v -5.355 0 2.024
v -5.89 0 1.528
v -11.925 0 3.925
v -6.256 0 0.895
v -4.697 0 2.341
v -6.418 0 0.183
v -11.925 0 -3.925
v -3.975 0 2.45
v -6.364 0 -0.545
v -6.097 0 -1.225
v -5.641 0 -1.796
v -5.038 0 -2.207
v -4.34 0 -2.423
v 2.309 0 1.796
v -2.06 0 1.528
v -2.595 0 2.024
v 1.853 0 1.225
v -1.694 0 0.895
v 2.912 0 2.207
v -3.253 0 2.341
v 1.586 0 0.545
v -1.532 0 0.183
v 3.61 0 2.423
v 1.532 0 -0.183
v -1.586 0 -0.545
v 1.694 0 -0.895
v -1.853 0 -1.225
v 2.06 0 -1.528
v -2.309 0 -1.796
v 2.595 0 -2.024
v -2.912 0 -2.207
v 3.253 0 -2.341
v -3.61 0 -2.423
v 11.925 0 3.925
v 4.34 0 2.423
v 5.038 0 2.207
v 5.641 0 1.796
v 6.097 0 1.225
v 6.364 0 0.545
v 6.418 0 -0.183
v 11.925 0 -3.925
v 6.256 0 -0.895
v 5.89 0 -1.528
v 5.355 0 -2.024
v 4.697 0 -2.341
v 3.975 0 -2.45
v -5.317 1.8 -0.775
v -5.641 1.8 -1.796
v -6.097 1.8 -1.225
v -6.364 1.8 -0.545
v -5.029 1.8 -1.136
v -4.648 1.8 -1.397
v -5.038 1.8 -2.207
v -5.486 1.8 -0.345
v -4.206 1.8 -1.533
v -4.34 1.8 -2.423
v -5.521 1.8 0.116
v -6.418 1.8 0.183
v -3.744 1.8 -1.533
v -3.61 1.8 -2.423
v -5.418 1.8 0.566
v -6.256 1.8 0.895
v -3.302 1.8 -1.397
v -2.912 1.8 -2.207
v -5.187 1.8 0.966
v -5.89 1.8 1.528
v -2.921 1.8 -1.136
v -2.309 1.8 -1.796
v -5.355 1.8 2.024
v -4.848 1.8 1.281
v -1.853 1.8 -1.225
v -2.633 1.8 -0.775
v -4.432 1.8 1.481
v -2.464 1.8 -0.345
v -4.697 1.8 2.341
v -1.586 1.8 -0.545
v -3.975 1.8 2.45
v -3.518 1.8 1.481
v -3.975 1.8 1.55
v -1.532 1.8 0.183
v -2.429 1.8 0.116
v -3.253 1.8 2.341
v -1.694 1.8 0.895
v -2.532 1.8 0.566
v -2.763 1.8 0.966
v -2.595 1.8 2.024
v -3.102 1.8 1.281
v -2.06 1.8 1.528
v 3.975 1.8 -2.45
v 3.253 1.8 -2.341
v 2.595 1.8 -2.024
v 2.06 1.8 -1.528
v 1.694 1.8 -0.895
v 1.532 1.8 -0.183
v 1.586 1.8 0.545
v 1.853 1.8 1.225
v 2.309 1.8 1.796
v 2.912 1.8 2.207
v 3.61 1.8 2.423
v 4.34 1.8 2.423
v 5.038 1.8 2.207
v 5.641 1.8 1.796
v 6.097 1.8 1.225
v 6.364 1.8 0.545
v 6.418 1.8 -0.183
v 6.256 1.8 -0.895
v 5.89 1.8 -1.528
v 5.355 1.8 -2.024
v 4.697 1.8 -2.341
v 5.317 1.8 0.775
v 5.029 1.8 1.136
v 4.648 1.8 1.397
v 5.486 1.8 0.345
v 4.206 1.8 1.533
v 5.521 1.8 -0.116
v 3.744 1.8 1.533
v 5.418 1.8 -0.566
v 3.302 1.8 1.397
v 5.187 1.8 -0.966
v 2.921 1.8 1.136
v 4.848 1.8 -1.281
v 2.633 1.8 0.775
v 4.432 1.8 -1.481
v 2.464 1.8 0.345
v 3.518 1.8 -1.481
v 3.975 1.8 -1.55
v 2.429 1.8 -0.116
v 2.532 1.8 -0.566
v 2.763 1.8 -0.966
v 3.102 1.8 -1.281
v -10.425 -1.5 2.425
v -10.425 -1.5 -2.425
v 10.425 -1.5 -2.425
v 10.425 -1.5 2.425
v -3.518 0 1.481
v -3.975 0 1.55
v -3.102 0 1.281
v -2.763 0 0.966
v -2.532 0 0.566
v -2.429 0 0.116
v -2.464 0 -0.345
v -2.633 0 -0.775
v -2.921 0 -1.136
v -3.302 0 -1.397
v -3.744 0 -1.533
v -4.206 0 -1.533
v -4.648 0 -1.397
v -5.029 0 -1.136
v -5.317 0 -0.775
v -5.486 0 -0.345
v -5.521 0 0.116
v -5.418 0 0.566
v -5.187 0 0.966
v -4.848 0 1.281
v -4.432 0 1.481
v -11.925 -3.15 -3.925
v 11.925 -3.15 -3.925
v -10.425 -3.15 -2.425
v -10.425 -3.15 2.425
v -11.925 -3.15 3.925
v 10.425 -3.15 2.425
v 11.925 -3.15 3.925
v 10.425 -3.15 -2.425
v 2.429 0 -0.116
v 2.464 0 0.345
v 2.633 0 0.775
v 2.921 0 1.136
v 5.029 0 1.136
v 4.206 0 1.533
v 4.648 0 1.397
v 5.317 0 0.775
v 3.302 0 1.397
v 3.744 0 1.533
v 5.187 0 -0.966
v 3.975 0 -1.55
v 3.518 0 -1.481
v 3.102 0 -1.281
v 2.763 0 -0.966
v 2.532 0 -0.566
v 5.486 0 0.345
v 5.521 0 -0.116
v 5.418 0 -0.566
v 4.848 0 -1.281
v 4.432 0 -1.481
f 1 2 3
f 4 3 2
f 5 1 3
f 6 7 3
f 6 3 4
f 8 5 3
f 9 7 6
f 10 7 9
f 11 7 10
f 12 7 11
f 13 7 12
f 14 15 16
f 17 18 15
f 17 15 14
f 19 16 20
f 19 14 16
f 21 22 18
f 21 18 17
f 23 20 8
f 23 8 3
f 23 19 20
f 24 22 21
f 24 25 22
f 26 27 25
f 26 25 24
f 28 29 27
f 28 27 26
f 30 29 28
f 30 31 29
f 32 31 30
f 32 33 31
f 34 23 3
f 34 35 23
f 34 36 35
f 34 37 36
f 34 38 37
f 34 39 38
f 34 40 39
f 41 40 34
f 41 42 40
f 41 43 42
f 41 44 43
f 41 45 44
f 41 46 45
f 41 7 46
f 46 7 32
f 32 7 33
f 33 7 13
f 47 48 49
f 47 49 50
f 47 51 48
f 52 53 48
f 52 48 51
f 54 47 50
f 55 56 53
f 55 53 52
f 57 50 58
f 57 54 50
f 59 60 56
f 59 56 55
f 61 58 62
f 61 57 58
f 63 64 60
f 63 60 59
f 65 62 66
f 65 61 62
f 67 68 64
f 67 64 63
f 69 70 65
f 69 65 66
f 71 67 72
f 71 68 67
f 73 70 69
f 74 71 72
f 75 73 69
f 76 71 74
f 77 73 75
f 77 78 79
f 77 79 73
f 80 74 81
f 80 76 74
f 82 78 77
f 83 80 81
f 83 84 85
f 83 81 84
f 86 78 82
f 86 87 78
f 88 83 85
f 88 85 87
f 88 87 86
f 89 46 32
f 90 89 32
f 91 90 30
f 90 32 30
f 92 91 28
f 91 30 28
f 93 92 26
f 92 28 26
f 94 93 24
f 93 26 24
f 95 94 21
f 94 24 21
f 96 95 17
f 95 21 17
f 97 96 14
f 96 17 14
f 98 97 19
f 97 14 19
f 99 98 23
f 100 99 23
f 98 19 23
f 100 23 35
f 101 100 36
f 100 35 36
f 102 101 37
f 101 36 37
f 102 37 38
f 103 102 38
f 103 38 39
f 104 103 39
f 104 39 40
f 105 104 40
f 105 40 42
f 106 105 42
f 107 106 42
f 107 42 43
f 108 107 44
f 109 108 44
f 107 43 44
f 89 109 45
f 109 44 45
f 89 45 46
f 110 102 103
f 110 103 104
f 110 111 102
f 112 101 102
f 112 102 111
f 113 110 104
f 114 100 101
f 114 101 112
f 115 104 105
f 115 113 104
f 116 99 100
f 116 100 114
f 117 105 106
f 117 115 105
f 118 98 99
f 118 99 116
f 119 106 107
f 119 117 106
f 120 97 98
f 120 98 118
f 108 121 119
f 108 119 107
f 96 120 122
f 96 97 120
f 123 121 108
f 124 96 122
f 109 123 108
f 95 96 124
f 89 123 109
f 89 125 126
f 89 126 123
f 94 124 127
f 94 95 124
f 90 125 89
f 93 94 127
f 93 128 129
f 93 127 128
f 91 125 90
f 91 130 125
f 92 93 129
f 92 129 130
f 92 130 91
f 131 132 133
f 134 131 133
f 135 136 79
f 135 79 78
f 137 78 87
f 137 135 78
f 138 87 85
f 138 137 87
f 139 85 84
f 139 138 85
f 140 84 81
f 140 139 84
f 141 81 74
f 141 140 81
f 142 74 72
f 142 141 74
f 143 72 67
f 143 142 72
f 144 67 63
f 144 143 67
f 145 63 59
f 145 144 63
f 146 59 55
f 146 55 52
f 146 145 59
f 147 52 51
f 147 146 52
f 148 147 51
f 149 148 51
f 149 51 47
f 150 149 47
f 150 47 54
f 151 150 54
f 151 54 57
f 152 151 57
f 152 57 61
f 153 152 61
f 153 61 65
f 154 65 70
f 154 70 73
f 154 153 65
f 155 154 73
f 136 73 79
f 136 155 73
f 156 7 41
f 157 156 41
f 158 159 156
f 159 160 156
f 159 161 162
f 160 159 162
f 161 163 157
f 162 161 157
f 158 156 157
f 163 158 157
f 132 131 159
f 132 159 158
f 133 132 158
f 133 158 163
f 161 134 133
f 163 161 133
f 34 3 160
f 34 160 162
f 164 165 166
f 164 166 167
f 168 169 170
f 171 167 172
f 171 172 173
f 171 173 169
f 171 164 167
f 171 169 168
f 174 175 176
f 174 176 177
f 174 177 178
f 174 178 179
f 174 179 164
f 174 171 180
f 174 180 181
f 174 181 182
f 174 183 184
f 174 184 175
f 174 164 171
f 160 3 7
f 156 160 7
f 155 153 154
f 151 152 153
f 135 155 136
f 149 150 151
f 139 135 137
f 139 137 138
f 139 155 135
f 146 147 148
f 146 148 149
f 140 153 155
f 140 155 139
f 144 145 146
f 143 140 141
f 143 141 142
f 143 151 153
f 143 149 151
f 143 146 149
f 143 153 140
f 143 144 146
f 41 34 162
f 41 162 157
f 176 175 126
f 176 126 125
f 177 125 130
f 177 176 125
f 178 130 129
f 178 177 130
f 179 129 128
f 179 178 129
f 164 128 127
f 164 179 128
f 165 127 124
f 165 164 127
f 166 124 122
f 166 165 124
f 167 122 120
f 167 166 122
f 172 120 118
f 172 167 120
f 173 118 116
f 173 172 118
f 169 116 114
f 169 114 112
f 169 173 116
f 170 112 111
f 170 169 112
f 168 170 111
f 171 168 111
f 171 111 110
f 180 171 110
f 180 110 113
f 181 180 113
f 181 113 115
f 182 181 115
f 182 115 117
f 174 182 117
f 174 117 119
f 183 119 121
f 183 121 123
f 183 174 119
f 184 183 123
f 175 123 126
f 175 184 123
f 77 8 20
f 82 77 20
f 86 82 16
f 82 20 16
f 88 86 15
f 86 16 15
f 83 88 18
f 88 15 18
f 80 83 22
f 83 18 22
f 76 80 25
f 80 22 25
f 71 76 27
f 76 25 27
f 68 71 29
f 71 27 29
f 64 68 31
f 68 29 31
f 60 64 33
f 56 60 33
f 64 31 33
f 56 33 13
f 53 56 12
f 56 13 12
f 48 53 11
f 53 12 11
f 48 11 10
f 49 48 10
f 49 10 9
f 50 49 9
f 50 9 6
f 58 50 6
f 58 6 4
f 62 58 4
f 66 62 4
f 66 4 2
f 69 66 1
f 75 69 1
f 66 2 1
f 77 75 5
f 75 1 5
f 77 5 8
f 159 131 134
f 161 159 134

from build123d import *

# Parameters (mm, degrees)
SKETCH1_W           = 23.85
SKETCH1_H           = 7.85
BOSS_EXTRUDE1_DEPTH = 3.15
SHELL1_T            = -1.5
SKETCH2_R           = 2.45
SKETCH2_R_2         = 1.55
BOSS_EXTRUDE2_DEPTH = 1.8


with BuildPart() as part:
    # Sketch1 → Boss-Extrude1 (new body)
    with BuildSketch(Plane(origin=(0, 0, 0), x_dir=(1, 0, 0), z_dir=(0, 1, 0))):
        Rectangle(SKETCH1_W, SKETCH1_H)
    extrude(amount=-BOSS_EXTRUDE1_DEPTH)

    # Shell1
    shell1_openings = [part.faces().sort_by_distance(p)[0] for p in [
        (0, -3.15, 0),
    ]]
    offset(amount=SHELL1_T, openings=shell1_openings, kind=Kind.INTERSECTION)

    # Sketch2 → Boss-Extrude2 (add)
    # profile 1 of 2: a face of its own
    with BuildSketch(Plane(origin=(0, 0, 0), x_dir=(1, 0, 0), z_dir=(0, 1, 0))):
        with Locations(Location((-3.975, 0, 0), (0, 0, 270))):
            Circle(SKETCH2_R)
        with Locations(Location((-3.975, 0, 0), (0, 0, 270))):
            Circle(SKETCH2_R_2, mode=Mode.SUBTRACT)
    # profile 2 of 2: a face of its own
    with BuildSketch(Plane(origin=(0, 0, 0), x_dir=(1, 0, 0), z_dir=(0, 1, 0))):
        with Locations(Location((3.975, 0, 0), (0, 0, 90))):
            Circle(SKETCH2_R)
        with Locations(Location((3.975, 0, 0), (0, 0, 90))):
            Circle(SKETCH2_R_2, mode=Mode.SUBTRACT)
    extrude(amount=BOSS_EXTRUDE2_DEPTH)


solid = part.part
